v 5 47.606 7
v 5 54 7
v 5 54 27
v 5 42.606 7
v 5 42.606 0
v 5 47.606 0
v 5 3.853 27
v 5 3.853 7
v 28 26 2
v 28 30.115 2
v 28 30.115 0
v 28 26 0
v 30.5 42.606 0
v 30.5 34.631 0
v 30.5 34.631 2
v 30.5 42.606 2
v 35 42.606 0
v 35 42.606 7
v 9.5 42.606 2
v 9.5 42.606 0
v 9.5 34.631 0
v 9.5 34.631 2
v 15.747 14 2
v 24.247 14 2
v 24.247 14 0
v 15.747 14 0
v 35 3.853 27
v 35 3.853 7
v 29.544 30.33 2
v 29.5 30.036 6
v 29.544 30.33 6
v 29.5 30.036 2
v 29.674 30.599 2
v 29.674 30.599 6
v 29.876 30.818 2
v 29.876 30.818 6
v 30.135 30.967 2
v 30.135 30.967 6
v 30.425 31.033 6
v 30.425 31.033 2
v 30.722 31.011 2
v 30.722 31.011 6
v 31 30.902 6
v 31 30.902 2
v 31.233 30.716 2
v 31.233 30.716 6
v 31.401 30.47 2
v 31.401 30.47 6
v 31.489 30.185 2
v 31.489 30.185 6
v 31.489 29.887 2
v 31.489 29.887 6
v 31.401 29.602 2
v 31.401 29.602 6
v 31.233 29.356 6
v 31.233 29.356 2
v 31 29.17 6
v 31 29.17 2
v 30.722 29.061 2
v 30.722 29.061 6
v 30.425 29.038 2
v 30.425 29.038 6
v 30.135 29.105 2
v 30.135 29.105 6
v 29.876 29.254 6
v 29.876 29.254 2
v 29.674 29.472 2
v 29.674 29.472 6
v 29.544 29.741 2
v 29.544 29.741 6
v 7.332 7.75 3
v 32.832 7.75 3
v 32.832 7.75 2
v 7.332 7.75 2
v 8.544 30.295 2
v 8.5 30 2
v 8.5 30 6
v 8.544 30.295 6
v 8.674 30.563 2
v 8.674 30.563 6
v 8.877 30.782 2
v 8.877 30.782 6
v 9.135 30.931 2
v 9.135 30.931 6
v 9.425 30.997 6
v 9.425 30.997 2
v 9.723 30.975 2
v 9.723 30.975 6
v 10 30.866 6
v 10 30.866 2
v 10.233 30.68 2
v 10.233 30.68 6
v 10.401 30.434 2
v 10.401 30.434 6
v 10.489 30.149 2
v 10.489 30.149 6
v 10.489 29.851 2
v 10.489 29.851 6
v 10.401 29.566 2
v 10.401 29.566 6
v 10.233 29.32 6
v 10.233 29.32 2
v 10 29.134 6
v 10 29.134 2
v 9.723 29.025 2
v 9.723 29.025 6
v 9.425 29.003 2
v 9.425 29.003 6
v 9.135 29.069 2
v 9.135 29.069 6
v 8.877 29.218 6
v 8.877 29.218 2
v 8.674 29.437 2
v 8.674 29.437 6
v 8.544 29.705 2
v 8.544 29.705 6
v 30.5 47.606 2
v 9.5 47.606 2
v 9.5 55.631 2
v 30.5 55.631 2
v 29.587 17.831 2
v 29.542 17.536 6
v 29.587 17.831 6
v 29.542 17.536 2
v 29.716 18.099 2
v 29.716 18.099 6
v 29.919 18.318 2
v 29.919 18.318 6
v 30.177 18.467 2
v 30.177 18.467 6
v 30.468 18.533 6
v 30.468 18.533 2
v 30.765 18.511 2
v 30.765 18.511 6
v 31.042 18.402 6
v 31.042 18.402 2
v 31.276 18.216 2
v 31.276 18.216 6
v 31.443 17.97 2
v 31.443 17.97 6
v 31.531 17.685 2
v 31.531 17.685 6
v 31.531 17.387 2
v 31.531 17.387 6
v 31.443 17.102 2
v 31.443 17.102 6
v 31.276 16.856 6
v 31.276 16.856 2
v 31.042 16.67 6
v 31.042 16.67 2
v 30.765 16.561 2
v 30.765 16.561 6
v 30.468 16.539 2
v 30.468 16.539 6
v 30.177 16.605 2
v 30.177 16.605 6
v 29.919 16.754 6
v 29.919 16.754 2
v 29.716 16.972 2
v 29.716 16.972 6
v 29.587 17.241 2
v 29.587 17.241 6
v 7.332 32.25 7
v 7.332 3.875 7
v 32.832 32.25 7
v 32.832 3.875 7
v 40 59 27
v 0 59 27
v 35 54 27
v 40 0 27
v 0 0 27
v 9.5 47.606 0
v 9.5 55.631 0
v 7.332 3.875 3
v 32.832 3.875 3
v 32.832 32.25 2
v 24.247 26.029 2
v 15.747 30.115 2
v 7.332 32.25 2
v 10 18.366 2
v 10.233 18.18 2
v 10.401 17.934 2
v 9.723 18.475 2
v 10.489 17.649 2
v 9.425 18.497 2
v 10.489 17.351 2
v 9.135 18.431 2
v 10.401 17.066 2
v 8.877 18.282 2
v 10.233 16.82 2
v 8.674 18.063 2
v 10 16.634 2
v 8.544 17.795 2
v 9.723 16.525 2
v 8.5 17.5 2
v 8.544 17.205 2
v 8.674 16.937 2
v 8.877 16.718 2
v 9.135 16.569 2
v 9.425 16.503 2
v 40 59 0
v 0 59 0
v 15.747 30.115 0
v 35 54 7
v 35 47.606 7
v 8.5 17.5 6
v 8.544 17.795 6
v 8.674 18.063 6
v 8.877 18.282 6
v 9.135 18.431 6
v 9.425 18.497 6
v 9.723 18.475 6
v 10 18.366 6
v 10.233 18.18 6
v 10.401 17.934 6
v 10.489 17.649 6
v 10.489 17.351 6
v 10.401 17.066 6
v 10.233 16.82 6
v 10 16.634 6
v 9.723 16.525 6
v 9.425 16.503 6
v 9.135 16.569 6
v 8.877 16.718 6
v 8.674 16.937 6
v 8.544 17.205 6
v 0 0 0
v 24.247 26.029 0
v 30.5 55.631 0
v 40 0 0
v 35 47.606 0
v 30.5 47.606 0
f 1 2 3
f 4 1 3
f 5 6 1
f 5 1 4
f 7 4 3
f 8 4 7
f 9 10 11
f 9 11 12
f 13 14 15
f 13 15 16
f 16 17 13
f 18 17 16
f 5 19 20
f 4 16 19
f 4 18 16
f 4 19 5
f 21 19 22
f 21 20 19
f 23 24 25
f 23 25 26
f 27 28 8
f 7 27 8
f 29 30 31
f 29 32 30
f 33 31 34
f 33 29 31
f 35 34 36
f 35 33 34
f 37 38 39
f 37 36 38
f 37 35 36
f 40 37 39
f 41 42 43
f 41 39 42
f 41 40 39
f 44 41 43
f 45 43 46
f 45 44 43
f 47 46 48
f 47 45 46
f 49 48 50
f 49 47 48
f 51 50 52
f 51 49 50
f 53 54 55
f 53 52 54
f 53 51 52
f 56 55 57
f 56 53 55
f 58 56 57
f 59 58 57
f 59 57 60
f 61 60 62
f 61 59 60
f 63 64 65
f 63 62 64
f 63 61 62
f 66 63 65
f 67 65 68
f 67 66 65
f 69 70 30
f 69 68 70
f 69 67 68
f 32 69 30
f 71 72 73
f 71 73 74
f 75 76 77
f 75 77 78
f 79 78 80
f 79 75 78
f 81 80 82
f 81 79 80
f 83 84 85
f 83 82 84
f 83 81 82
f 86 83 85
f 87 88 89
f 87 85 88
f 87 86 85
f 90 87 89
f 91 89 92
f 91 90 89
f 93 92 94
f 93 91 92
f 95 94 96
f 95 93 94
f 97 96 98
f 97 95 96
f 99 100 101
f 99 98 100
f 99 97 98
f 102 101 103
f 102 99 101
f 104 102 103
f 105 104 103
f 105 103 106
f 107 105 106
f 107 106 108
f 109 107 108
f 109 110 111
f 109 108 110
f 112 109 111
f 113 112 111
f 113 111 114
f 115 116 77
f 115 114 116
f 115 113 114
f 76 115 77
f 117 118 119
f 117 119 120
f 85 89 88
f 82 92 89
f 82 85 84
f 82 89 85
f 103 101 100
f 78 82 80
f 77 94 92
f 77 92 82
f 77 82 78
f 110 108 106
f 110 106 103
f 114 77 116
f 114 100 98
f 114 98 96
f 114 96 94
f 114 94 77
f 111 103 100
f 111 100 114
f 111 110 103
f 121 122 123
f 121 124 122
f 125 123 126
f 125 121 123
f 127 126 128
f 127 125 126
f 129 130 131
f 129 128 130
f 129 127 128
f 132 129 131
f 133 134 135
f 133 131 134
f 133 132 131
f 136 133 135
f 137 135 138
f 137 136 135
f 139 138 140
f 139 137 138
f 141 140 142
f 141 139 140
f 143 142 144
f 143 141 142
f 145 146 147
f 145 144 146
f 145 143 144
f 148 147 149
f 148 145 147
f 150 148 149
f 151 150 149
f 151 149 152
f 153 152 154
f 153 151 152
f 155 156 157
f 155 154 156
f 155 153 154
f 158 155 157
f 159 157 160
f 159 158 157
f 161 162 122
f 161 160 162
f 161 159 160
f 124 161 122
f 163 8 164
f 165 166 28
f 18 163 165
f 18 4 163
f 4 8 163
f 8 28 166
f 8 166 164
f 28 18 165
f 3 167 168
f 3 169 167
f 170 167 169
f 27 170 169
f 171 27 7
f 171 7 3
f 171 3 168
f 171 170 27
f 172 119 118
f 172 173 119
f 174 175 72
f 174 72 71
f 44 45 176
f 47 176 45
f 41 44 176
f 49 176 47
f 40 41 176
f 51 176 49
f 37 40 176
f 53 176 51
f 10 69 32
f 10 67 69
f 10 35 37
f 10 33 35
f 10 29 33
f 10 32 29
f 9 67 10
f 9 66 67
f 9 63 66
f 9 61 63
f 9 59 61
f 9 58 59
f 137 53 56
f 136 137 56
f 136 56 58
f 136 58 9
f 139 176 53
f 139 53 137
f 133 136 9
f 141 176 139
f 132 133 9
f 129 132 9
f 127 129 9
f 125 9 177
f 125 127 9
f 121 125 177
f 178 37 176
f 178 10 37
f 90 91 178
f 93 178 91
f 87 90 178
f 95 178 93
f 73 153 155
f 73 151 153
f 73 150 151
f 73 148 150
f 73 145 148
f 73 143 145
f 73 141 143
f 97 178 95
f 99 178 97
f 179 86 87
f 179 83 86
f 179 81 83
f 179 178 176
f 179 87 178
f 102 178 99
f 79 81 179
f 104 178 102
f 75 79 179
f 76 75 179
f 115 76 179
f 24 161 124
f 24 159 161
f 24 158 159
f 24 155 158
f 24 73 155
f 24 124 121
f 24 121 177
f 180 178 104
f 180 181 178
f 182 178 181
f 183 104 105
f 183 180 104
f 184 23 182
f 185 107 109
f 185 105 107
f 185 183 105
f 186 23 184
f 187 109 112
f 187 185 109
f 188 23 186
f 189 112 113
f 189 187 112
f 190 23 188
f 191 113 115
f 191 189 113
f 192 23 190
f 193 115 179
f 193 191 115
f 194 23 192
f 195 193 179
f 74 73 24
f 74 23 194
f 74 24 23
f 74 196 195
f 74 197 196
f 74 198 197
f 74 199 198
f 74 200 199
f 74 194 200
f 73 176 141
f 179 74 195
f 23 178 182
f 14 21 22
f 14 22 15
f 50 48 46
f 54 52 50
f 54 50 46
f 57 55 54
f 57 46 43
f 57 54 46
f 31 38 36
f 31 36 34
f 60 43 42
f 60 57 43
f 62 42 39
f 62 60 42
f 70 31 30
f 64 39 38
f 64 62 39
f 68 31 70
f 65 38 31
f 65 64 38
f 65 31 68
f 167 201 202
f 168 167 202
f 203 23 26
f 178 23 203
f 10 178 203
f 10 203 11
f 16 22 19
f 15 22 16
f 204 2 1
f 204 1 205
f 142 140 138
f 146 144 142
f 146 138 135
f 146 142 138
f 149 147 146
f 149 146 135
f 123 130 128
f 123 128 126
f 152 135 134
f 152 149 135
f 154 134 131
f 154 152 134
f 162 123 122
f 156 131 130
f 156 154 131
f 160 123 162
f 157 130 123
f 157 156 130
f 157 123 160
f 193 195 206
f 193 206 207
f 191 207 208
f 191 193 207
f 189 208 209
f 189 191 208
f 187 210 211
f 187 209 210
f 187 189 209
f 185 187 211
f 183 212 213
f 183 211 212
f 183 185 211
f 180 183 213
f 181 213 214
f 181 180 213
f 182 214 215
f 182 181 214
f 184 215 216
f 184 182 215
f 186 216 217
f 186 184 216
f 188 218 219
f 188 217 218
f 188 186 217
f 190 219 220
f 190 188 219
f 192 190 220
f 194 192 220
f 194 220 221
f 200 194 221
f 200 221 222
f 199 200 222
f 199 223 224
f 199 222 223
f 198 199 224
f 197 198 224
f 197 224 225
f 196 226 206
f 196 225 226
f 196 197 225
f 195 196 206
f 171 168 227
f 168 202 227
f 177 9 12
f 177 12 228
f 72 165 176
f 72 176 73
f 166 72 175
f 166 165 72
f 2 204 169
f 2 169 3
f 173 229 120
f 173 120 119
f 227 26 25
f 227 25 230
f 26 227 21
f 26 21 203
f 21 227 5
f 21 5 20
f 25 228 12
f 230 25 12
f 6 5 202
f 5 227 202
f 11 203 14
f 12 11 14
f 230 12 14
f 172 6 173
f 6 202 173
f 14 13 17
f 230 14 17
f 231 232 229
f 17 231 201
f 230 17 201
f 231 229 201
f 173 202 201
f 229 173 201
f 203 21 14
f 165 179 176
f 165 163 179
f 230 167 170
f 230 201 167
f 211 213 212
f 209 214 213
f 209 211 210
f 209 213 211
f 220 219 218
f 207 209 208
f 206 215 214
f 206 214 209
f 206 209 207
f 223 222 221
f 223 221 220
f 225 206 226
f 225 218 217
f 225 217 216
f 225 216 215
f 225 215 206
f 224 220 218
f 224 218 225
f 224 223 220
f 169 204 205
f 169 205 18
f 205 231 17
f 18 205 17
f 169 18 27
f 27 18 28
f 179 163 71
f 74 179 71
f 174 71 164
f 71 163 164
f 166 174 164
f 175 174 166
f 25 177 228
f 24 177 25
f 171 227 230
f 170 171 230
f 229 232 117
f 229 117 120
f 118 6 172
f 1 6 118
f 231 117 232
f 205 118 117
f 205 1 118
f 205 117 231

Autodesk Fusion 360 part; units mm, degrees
sketch "Sketch1" plane through (0, 0, 0) normal (0, 0, 1) x (1, 0, 0)
  line L0 (0, 0) -> (0, 40)
  line L1 (0, 40) -> (40, 40)
  line L2 (40, 40) -> (40, 0)
  line L3 (40, 0) -> (0, 0)
extrude "Extrude1" add sketch "Sketch1" along normal blind 7
sketch "Sketch2" plane through (0, 0, 7) normal (0, 0, 1) x (-1, 0, 0)
  line L0 (-40, 0) -> (-40, -40)
  line L1 (-40, -40) -> (0, -40)
  line L2 (0, -40) -> (0, 0)
  line L3 (0, 0) -> (-40, 0)
  line L4 (-32.8325, -7.75) -> (-7.3325, -7.75)
  line L5 (-7.3325, -7.75) -> (-7.3325, -32.25)
  line L6 (-7.3325, -32.25) -> (-32.8325, -32.25)
  line L7 (-32.8325, -32.25) -> (-32.8325, -7.75)
  line L8 (-32.8325, -7.75) -> (-7.3325, -32.25) construction
  line L9 (-7.3325, -7.75) -> (-32.8325, -32.25) construction
  dimension "d3" = 24.5
  dimension "d4" = 25.5
extrude "Extrude2" cut sketch "Sketch2" against normal blind 5 contours L4 L5 L6 L7
sketch "Sketch3" plane through (0, 0, 7) normal (0, 0, 1) x (-1, 0, 0)
  line L0 (-7.3325, -7.75) -> (-7.3325, -32.25)
  line L1 (-7.3325, -32.25) -> (-32.8325, -32.25)
  line L2 (-32.8325, -32.25) -> (-32.8325, -7.75)
  line L3 (-32.8325, -7.75) -> (-7.3325, -7.75)
  line L4 (-40, 0) -> (-40, -40)
  line L5 (-40, -40) -> (0, -40)
  line L6 (0, -40) -> (0, 0)
  line L7 (0, 0) -> (-40, 0)
  line L8 (-7.3325, -7.75) -> (-7.3325, 0.0071)
  line L9 (-32.8325, -7.75) -> (-32.8325, 0.0018)
extrude "Extrude3" cut sketch "Sketch3" against normal blind 4 contours L3 L7 L8 L9
sketch "Sketch4" plane through (0, 0, 2) normal (0, 0, 1) x (-1, 0, 0)
  line L0 (-32.8325, -32.25) -> (-7.3325, -32.25)
  line L1 (-7.3325, -32.25) -> (-7.3325, -7.75)
  line L2 (-7.3325, -7.75) -> (-32.8325, -7.75)
  line L3 (-32.8325, -7.75) -> (-32.8325, -32.25)
  line L4 (-19.9972, -32) -> (-19.9972, -7.7499)
  line L5 (-7.3325, -20) -> (-32.8325, -20)
  line L6 (-23.9823, -7.75) -> (-23.9823, -14.25)
  line L7 (-23.9823, -14.25) -> (-7.3325, -14.25)
  line L8 (-23.9823, -14.25) -> (-32.8333, -14.25)
  line L9 (-19.9972, -14.25) -> (-19.9972, -18.25)
  line L10 (-23.9972, -14.25) -> (-15.9972, -14.25)
  line L11 (-15.9972, -14.25) -> (-15.9972, -22.25)
  line L12 (-15.9972, -22.25) -> (-23.9972, -22.25)
  line L13 (-23.9972, -22.25) -> (-23.9972, -14.25)
  line L14 (-23.9972, -14.25) -> (-15.9972, -22.25) construction
  line L15 (-15.9972, -14.25) -> (-23.9972, -22.25) construction
  dimension "d9" = 6.5
  dimension "d10" = 4
  dimension "d11" = 8
extrude "Extrude4" cut sketch "Sketch4" against normal blind 5 contours L4 L5 L7 L8 L9 L10 L13 | L4 L5 L12 L13 | L4 L5 L11 L12 | L4 L5 L7 L9 L10 L11
sketch "Sketch5" plane through (0, 0, 2) normal (0, 0, 1) x (-1, 0, 0)
  line L0 (-15.9972, -14.25) -> (-15.9972, -22.25)
  line L1 (-15.9972, -22.25) -> (-23.9972, -22.25)
  line L2 (-23.9972, -22.25) -> (-23.9972, -14.25)
  line L3 (-23.9972, -14.25) -> (-15.9972, -14.25)
  line L4 (-32.8325, -32.25) -> (-7.3325, -32.25)
  line L5 (-7.3325, -32.25) -> (-7.3325, -7.75)
  line L6 (-7.3325, -7.75) -> (-32.8325, -7.75)
  line L7 (-32.8325, -7.75) -> (-32.8325, -32.25)
  line L8 (-20, -32) -> (-20.0825, -7.75)
  line L9 (-20, -32) -> (-20, -30)
  line L10 (-20, -30) -> (-30.4999, -30.0357)
  circle A0 centre (-30.4999, -30.0357) radius 1
  line L11 (-20, -30) -> (-9.5, -30)
  circle A1 centre (-9.5, -30) radius 1
  line L12 (-9.5, -30) -> (-9.5, -17.5)
  line L13 (-30.4999, -30.0357) -> (-30.5425, -17.5358)
  circle A2 centre (-9.5, -17.5) radius 1
  circle A3 centre (-30.5425, -17.5358) radius 1
  dimension "d14" = 10.5
  dimension "d15" = 2
  dimension "d16" = 10.5
  dimension "d17" = 2
  dimension "d18" = 12.5
  dimension "d19" = 12.5
  dimension "d20" = 2
  dimension "d21" = 2
extrude "Extrude5" add sketch "Sketch5" along normal blind 2 contours A2 | L11 A1 L12 | L11 A1 L12 | A3 | L10 A0 L13 | L10 A0 L13
sketch "Sketch6" plane through (0, 0, 7) normal (0, 0, 1) x (-1, 0, 0)
  line L0 (-32.8325, -32.25) -> (-32.8325, 0)
  line L1 (-32.8325, 0) -> (-40, 0)
  line L2 (-40, 0) -> (-40, -40)
  line L3 (-40, -40) -> (0, -40)
  line L4 (0, -40) -> (0, 0)
  line L5 (0, 0) -> (-7.3325, 0)
  line L6 (-7.3325, 0) -> (-7.3325, -32.25)
  line L7 (-7.3325, -32.25) -> (-32.8325, -32.25)
  line L8 (-40, 0) -> (0, 0)
  line L9 (-20, -40) -> (-20, 0)
  line L10 (-20, -40) -> (-20, -36.5)
  line L11 (-20, -36.5) -> (-36, -36.5)
  line L12 (-20, -36.5) -> (-4, -36.5)
  circle A0 centre (-36, -36.5) radius 2.5
  circle A1 centre (-4, -36.5) radius 2.5
  line L13 (-36, -36.5) -> (-36, -6.5)
  line L14 (-4, -36.5) -> (-4, -6.5)
  circle A2 centre (-36, -6.5) radius 2.5
  circle A3 centre (-4, -6.5) radius 2.5
  dimension "d24" = 3.5
  dimension "d25" = 5
  dimension "d26" = 5
  dimension "d27" = 30
  dimension "d28" = 30
  dimension "d29" = 5
  dimension "d30" = 5
extrude "Extrude6" cut sketch "Sketch6" against normal blind 7 contours A2 | L11 A0 L13 | L11 A0 L13 | A3 | L12 A1 L14 | L12 A1 L14
sketch "Sketch7" plane through (0, 0, 7) normal (0, 0, 1) x (-1, 0, 0)
  circle A0 centre (-4, -36.5) radius 2.5
  circle A1 centre (-36, -36.5) radius 2.5
  circle A2 centre (-4, -6.5) radius 2.5
  circle A3 centre (-36, -6.5) radius 2.5
  line L0 (-32.8325, -32.25) -> (-32.8325, 0)
  line L1 (-32.8325, 0) -> (-40, 0)
  line L2 (-40, 0) -> (-40, -40)
  line L3 (-40, -40) -> (0, -40)
  line L4 (0, -40) -> (0, 0)
  line L5 (0, 0) -> (-7.3325, 0)
  line L6 (-7.3325, 0) -> (-7.3325, -32.25)
  line L7 (-7.3325, -32.25) -> (-32.8325, -32.25)
  line L8 (-15.9972, -22.25) -> (-23.9972, -14.25)
  line L9 (-23.9972, -14.25) -> (-23.9972, -22.25)
  line L10 (-23.9972, -22.25) -> (-15.9972, -14.25)
  line L11 (-24.2472, -14) -> (-15.7472, -14)
  line L12 (-15.7472, -14) -> (-15.7472, -22.5)
  line L13 (-15.7472, -22.5) -> (-24.2472, -22.5)
  line L14 (-24.2472, -22.5) -> (-24.2472, -14)
  line L15 (-24.2472, -14) -> (-15.7472, -22.5) construction
  line L16 (-15.7472, -14) -> (-24.2472, -22.5) construction
  dimension "d33" = 8.5
  dimension "d34" = 8.5
extrude "Extrude7" cut sketch "Sketch7" against normal blind 20 contours L8 L9 L10 | L11 L12 L13 L14
sketch "Sketch8" plane through (0, 0, 2) normal (0, 0, 1) x (-1, 0, 0)
  line L0 (-15.7472, -14) -> (-15.7472, -22.5)
  line L1 (-15.7472, -22.5) -> (-24.2472, -22.5)
  line L2 (-24.2472, -22.5) -> (-24.2472, -14)
  line L3 (-24.2472, -14) -> (-15.7472, -14)
  circle A0 centre (-9.5, -17.5) radius 1
  circle A1 centre (-30.4999, -30.0357) radius 1
  circle A2 centre (-30.5425, -17.5358) radius 1
  circle A3 centre (-9.5, -30) radius 1
  line L4 (-32.8325, -32.25) -> (-7.3325, -32.25)
  line L5 (-7.3325, -32.25) -> (-7.3325, -7.75)
  line L6 (-7.3325, -7.75) -> (-32.8325, -7.75)
  line L7 (-32.8325, -7.75) -> (-32.8325, -32.25)
  line L8 (-15.7472, -27.8448) -> (-24.2472, -27.8448)
  line L9 (-24.2472, -27.8448) -> (-24.2472, -17.1552)
  line L10 (-24.2472, -17.1552) -> (-15.7472, -17.1552)
  line L11 (-15.7472, -17.1552) -> (-15.7472, -27.8448)
  line L12 (-15.7472, -27.8448) -> (-24.2472, -17.1552) construction
  line L13 (-24.2472, -27.8448) -> (-15.7472, -17.1552) construction
extrude "Extrude8" cut sketch "Sketch8" against normal blind 20 contours L1 L8 L9 L11
sketch "Sketch9" plane through (0, 0, 2) normal (0, 0, 1) x (-1, 0, 0)
  line L0 (-24.2472, -27.8448) -> (-24.2472, -14)
  line L1 (-24.2472, -14) -> (-15.7472, -14)
  line L2 (-15.7472, -14) -> (-15.7472, -27.8448)
  line L3 (-15.7472, -27.8448) -> (-24.2472, -27.8448)
  circle A0 centre (-9.5, -17.5) radius 1
  circle A1 centre (-30.4999, -30.0357) radius 1
  circle A2 centre (-30.5425, -17.5358) radius 1
  circle A3 centre (-9.5, -30) radius 1
  line L4 (-32.8325, -32.25) -> (-7.3325, -32.25)
  line L5 (-7.3325, -32.25) -> (-7.3325, -7.75)
  line L6 (-7.3325, -7.75) -> (-32.8325, -7.75)
  line L7 (-32.8325, -7.75) -> (-32.8325, -32.25)
  line L8 (-15.7472, -30.1146) -> (-24.2472, -30.1146)
  line L9 (-24.2472, -30.1146) -> (-24.2472, -25.575)
  line L10 (-24.2472, -25.575) -> (-15.7472, -25.575)
  line L11 (-15.7472, -25.575) -> (-15.7472, -30.1146)
  line L12 (-15.7472, -30.1146) -> (-24.2472, -25.575) construction
  line L13 (-24.2472, -30.1146) -> (-15.7472, -25.575) construction
extrude "Extrude9" cut sketch "Sketch9" against normal blind 20 contours L3 L8 L9 L11
sketch "Sketch10" plane through (0, 0, 2) normal (0, 0, 1) x (-1, 0, 0)
  line L0 (-32.8325, -32.25) -> (-7.3325, -32.25)
  line L1 (-7.3325, -32.25) -> (-7.3325, -7.75)
  line L2 (-7.3325, -7.75) -> (-32.8325, -7.75)
  line L3 (-32.8325, -7.75) -> (-32.8325, -32.25)
  circle A0 centre (-9.5, -30) radius 1
  circle A1 centre (-30.5425, -17.5358) radius 1
  circle A2 centre (-30.4999, -30.0357) radius 1
  circle A3 centre (-9.5, -17.5) radius 1
  line L4 (-15.7472, -14) -> (-15.7472, -30.1146)
  line L5 (-15.7472, -30.1146) -> (-24.2472, -30.1146)
  line L6 (-24.2472, -30.1146) -> (-24.2472, -14)
  line L7 (-24.2472, -14) -> (-15.7472, -14)
  line L8 (-24.2472, -30.1146) -> (-28, -30.1146)
  line L9 (-28, -30.1146) -> (-28, -26)
  line L10 (-28, -26) -> (-24.2472, -26.029)
extrude "Extrude10" cut sketch "Sketch10" against normal blind 20 contours L6 L8 L9 L10
sketch "Sketch11" plane through (0, 0, 4) normal (0, 0, 1) x (-1, 0, 0)
  circle A0 centre (-9.5, -30) radius 1
  circle A1 centre (-9.5, -30) radius 1
extrude "Extrude11" add sketch "Sketch11" along normal blind 2
sketch "Sketch12" plane through (0, 0, 4) normal (0, 0, 1) x (-1, 0, 0)
  circle A0 centre (-9.5, -17.5) radius 1
  circle A1 centre (-9.5, -17.5) radius 1
extrude "Extrude12" add sketch "Sketch12" along normal blind 2
sketch "Sketch13" plane through (0, 0, 4) normal (0, 0, 1) x (-1, 0, 0)
  circle A0 centre (-30.4999, -30.0357) radius 1
  circle A1 centre (-30.4999, -30.0357) radius 1
extrude "Extrude13" add sketch "Sketch13" along normal blind 2
sketch "Sketch14" plane through (0, 0, 4) normal (0, 0, 1) x (-1, 0, 0)
  circle A0 centre (-30.5425, -17.5358) radius 1
  circle A1 centre (-30.5425, -17.5358) radius 1
extrude "Extrude14" add sketch "Sketch14" along normal blind 2
sketch "Sketch15" plane through (0, 0, 7) normal (0, 0, 1) x (-1, 0, 0)
  circle A0 centre (-4, -36.5) radius 2.5
  circle A1 centre (-36, -36.5) radius 2.5
  circle A2 centre (-4, -6.5) radius 2.5
  circle A3 centre (-36, -6.5) radius 2.5
  line L0 (-32.8325, -32.25) -> (-32.8325, 0)
  line L1 (-32.8325, 0) -> (-40, 0)
  line L2 (-40, 0) -> (-40, -40)
  line L3 (-40, -40) -> (0, -40)
  line L4 (0, -40) -> (0, 0)
  line L5 (0, 0) -> (-7.3325, 0)
  line L6 (-7.3325, 0) -> (-7.3325, -32.25)
  line L7 (-7.3325, -32.25) -> (-32.8325, -32.25)
  circle A4 centre (-4, -36.5) radius 2.5
extrude "Extrude15" add sketch "Sketch15" against normal blind 5 contours A0 A4
sketch "Sketch16" plane through (0, 0, 2) normal (0, 0, -1) x (1, 0, 0)
  circle A0 centre (4, -36.5) radius 2.5
  circle A1 centre (4, -36.5) radius 2.5
extrude "Extrude16" add sketch "Sketch16" along normal blind 2
sketch "Sketch17" plane through (0, 0, 0) normal (0, 0, 1) x (1, 0, 0)
  circle A0 centre (4, 6.5) radius 2.5
  circle A1 centre (4, 6.5) radius 2.5
  circle A2 centre (4, 6.5) radius 2.5
extrude "Extrude17" add sketch "Sketch17" along normal blind 7
sketch "Sketch18" plane through (0, 0, 7) normal (0, 0, 1) x (-1, 0, 0)
  circle A0 centre (-36, -36.5) radius 2.5
  circle A1 centre (-36, -6.5) radius 2.5
  line L0 (-32.8325, -32.25) -> (-32.8325, 0)
  line L1 (-32.8325, 0) -> (-40, 0)
  line L2 (-40, 0) -> (-40, -40)
  line L3 (-40, -40) -> (0, -40)
  line L4 (0, -40) -> (0, 0)
  line L5 (0, 0) -> (-7.3325, 0)
  line L6 (-7.3325, 0) -> (-7.3325, -32.25)
  line L7 (-7.3325, -32.25) -> (-32.8325, -32.25)
  circle A2 centre (-36, -36.5) radius 2.5
extrude "Extrude18" add sketch "Sketch18" against normal blind 7 contours A0 A2
sketch "Sketch19" plane through (0, 0, 7) normal (0, 0, 1) x (-1, 0, 0)
  circle A0 centre (-36, -6.5) radius 2.5
  line L0 (-32.8325, -32.25) -> (-32.8325, 0)
  line L1 (-32.8325, 0) -> (-40, 0)
  line L2 (-40, 0) -> (-40, -40)
  line L3 (-40, -40) -> (0, -40)
  line L4 (0, -40) -> (0, 0)
  line L5 (0, 0) -> (-7.3325, 0)
  line L6 (-7.3325, 0) -> (-7.3325, -32.25)
  line L7 (-7.3325, -32.25) -> (-32.8325, -32.25)
  circle A1 centre (-36, -6.5) radius 2.5
extrude "Extrude19" add sketch "Sketch19" against normal blind 7 contours A0 A1
sketch "Sketch20" plane through (0, 0, 0) normal (0, 0, 1) x (1, 0, 0)
  line L0 (40, 40) -> (0, 40)
  line L1 (0, 40) -> (0, 61.8124)
  line L2 (0, 61.8124) -> (40, 61.8124)
  line L3 (40, 61.8124) -> (40, 40)
  line L4 (40, 40) -> (0, 61.8124) construction
  line L5 (0, 40) -> (40, 61.8124) construction
extrude "Extrude20" add sketch "Sketch20" along normal blind 7
sketch "Sketch21" plane through (0, 0, 7) normal (0, 0, 1) x (-1, 0, 0)
  line L0 (-32.8325, -32.25) -> (-32.8325, 0)
  line L1 (-32.8325, 0) -> (-40, 0)
  line L2 (-40, 0) -> (-40, -61.8124)
  line L3 (-40, -61.8124) -> (0, -61.8124)
  line L4 (0, -61.8124) -> (0, 0)
  line L5 (0, 0) -> (-7.3325, 0)
  line L6 (-7.3325, 0) -> (-7.3325, -32.25)
  line L7 (-7.3325, -32.25) -> (-32.8325, -32.25)
  line L8 (-35, -42.6061) -> (-5, -42.6061)
  line L9 (-5, -42.6061) -> (-5, -47.6061)
  line L10 (-5, -47.6061) -> (-35, -47.6061)
  line L11 (-35, -47.6061) -> (-35, -42.6061)
  line L12 (-35, -42.6061) -> (-5, -47.6061) construction
  line L13 (-5, -42.6061) -> (-35, -47.6061) construction
  dimension "d63" = 5
  dimension "d64" = 30
extrude "Extrude21" cut sketch "Sketch21" against normal blind 7 contours L8 L9 L10 L11
sketch "Sketch22" plane through (0, 0, 7) normal (0, 0, 1) x (-1, 0, 0)
  line L0 (-5, -42.6061) -> (-5, -47.6061)
  line L1 (-5, -47.6061) -> (-35, -47.6061)
  line L2 (-35, -47.6061) -> (-35, -42.6061)
  line L3 (-35, -42.6061) -> (-5, -42.6061)
  line L4 (-32.8325, -32.25) -> (-32.8325, 0)
  line L5 (-32.8325, 0) -> (-40, 0)
  line L6 (-40, 0) -> (-40, -61.8124)
  line L7 (-40, -61.8124) -> (0, -61.8124)
  line L8 (0, -61.8124) -> (0, 0)
  line L9 (0, 0) -> (-7.3325, 0)
  line L10 (-7.3325, 0) -> (-7.3325, -32.25)
  line L11 (-7.3325, -32.25) -> (-32.8325, -32.25)
  line L12 (-20, -45) -> (-20, -56)
  line L13 (-20, -56) -> (-20, -61.8124)
  line L14 (-40, -59) -> (0, -59)
  line L15 (0, -59) -> (0, -64.6248)
  line L16 (0, -64.6248) -> (-40, -64.6248)
  line L17 (-40, -64.6248) -> (-40, -59)
  line L18 (-40, -59) -> (0, -64.6248) construction
  line L19 (0, -59) -> (-40, -64.6248) construction
  dimension "d67" = 5.6248
extrude "Extrude22" cut sketch "Sketch22" against normal blind 7 contours L7 L8 L13 L14 L15 | L6 L7 L13 L14 L17
sketch "Sketch23" plane through (0, 0, 7) normal (0, 0, 1) x (-1, 0, 0)
  line L0 (-40, -59) -> (0, -59)
  line L1 (0, -59) -> (0, 0)
  line L2 (0, 0) -> (-7.3325, 0)
  line L3 (-7.3325, 0) -> (-7.3325, -32.25)
  line L4 (-7.3325, -32.25) -> (-32.8325, -32.25)
  line L5 (-32.8325, -32.25) -> (-32.8325, 0)
  line L6 (-32.8325, 0) -> (-40, 0)
  line L7 (-40, 0) -> (-40, -59)
  line L8 (-5, -42.6061) -> (-5, -47.6061)
  line L9 (-5, -47.6061) -> (-35, -47.6061)
  line L10 (-35, -47.6061) -> (-35, -42.6061)
  line L11 (-35, -42.6061) -> (-5, -42.6061)
  circle A0 centre (-4, -55) radius 2.5
  circle A1 centre (-37, -55) radius 2.5
  circle A2 centre (-37, -4) radius 2.5
  circle A3 centre (-3.5618, -3.875) radius 2.5
  dimension "d70" = 5
  dimension "d71" = 5
  dimension "d72" = 5
  dimension "d73" = 5
extrude "Extrude23" add sketch "Sketch23" along normal blind 5 contours A0 | A1 | A2 | A3
sketch "Sketch24" plane through (0, 0, 12) normal (0, 0, 1) x (-1, 0, 0)
  circle A0 centre (-4, -55) radius 2.5
  circle A1 centre (-4, -55) radius 1
  circle A2 centre (-37, -55) radius 1
extrude "Extrude24" cut sketch "Sketch24" against normal blind 3 contours A1 | A2
sketch "Sketch25" plane through (0, 0, 12) normal (0, 0, 1) x (-1, 0, 0)
  circle A0 centre (-3.5618, -3.875) radius 2.5
  circle A1 centre (-3.5618, -3.875) radius 1
  circle A2 centre (-37, -4) radius 1
  dimension "d78" = 2
extrude "Extrude25" cut sketch "Sketch25" against normal blind 3 contours A1 | A2
sketch "Sketch26" plane through (0, 0, 0) normal (0, 0, -1) x (1, 0, 0)
  line L0 (0, -59) -> (40, -59)
  line L1 (40, -59) -> (40, 0)
  line L2 (40, 0) -> (0, 0)
  line L3 (0, 0) -> (0, -59)
  line L4 (5, -47.6061) -> (5, -42.6061)
  line L5 (5, -42.6061) -> (35, -42.6061)
  line L6 (35, -42.6061) -> (35, -47.6061)
  line L7 (35, -47.6061) -> (5, -47.6061)
  line L8 (28, -30.1146) -> (15.7472, -30.1146)
  line L9 (15.7472, -30.1146) -> (15.7472, -14)
  line L10 (15.7472, -14) -> (24.2472, -14)
  line L11 (24.2472, -14) -> (24.2472, -26.029)
  line L12 (24.2472, -26.029) -> (28, -26)
  line L13 (28, -26) -> (28, -30.1146)
  line L14 (30.5, -55.6314) -> (9.5, -55.6314)
  line L15 (9.5, -55.6314) -> (9.5, -34.6314)
  line L16 (9.5, -34.6314) -> (30.5, -34.6314)
  line L17 (30.5, -34.6314) -> (30.5, -55.6314)
  line L18 (30.5, -55.6314) -> (9.5, -34.6314) construction
  line L19 (9.5, -55.6314) -> (30.5, -34.6314) construction
  dimension "d81" = 21
  dimension "d82" = 21
extrude "Extrude26" cut sketch "Sketch26" against normal blind 2 contours L7 L14 L15 L17 | L5 L15 L16 L17
extrude "Extrude27" cut 1 faces at (35.013, 4.1739, 12) along direction (0, 0, -1) blind 5
extrude "Extrude28" cut 1 faces at (36.9751, 4.3324, 9) along direction (0, 0, -1) blind 2
extrude "Extrude29" cut 1 faces at (1.5748, 4.0489, 12) along direction (0, 0, -1) blind 5
extrude "Extrude30" cut 1 faces at (3.9958, 3.666, 9) along direction (0, 0, -1) blind 2
extrude "Extrude31" cut 1 faces at (2.013, 55.1739, 12) along direction (0, 0, -1) blind 5
extrude "Extrude32" cut 1 faces at (4.6415, 54.7287, 9) along direction (0, 0, -1) blind 2
extrude "Extrude33" cut 1 faces at (35.013, 55.1739, 12) along direction (0, 0, -1) blind 5
extrude "Extrude34" cut 1 faces at (37.4221, 54.7901, 9) along direction (0, 0, -1) blind 2
sketch "Sketch27" plane through (0, 0, 3) normal (0, 0, 1) x (-1, 0, 0)
  line L0 (-7.3325, -7.75) -> (-7.3325, 0)
  line L1 (-7.3325, 0) -> (-32.8325, 0)
  line L2 (-32.8325, 0) -> (-32.8325, -7.75)
  line L3 (-32.8325, -7.75) -> (-7.3325, -7.75)
  line L4 (-7.3325, -3.875) -> (-32.8325, -3.875)
  line L5 (-7.3325, -3.875) -> (-7.3325, 0)
  line L6 (-7.3325, 0) -> (-32.8325, 0)
  line L7 (-32.8325, 0) -> (-32.8325, -3.875)
extrude "Extrude35" add sketch "Sketch27" along normal blind 4 contours L0 L1 L2 L4 L5 L6 L7
sketch "Sketch28" plane through (0, 0, 7) normal (0, 0, 1) x (-1, 0, 0)
  line L0 (0, 0) -> (-40, 0)
  line L1 (-40, 0) -> (-40, -59)
  line L2 (-40, -59) -> (0, -59)
  line L3 (0, -59) -> (0, 0)
  line L4 (-32.8325, -3.875) -> (-7.3325, -3.875)
  line L5 (-7.3325, -3.875) -> (-7.3325, -32.25)
  line L6 (-7.3325, -32.25) -> (-32.8325, -32.25)
  line L7 (-32.8325, -32.25) -> (-32.8325, -3.875)
  line L8 (-5, -42.6061) -> (-5, -47.6061)
  line L9 (-5, -47.6061) -> (-35, -47.6061)
  line L10 (-35, -47.6061) -> (-35, -42.6061)
  line L11 (-35, -42.6061) -> (-5, -42.6061)
  line L12 (0, -59) -> (-40, -59)
  line L13 (-40, -59) -> (-40, -54)
  line L14 (-40, -54) -> (0, -54)
  line L15 (0, -54) -> (0, -59)
  dimension "d103" = 5
extrude "Extrude36" add sketch "Sketch28" along normal blind 20 contours L1 L2 L3 L12 L13 L14 L15
sketch "Sketch29" plane through (0, 0, 7) normal (0, 0, 1) x (-1, 0, 0)
  line L0 (-5, -42.6061) -> (-5, -47.6061)
  line L1 (-5, -47.6061) -> (-35, -47.6061)
  line L2 (-35, -47.6061) -> (-35, -42.6061)
  line L3 (-35, -42.6061) -> (-5, -42.6061)
  line L4 (-32.8325, -3.875) -> (-7.3325, -3.875)
  line L5 (-7.3325, -3.875) -> (-7.3325, -32.25)
  line L6 (-7.3325, -32.25) -> (-32.8325, -32.25)
  line L7 (-32.8325, -32.25) -> (-32.8325, -3.875)
  line L8 (-40, -54) -> (0, -54)
  line L9 (0, -54) -> (0, 0)
  line L10 (0, 0) -> (-40, 0)
  line L11 (-40, 0) -> (-40, -54)
  line L12 (-40, -54) -> (-35, -54)
  line L13 (-35, -54) -> (-35, 0)
  line L14 (-35, 0) -> (-40, 0)
  line L15 (-40, 0) -> (-40, -54)
extrude "Extrude37" add sketch "Sketch29" along normal blind 20 contours L2 L8 L10 L11 L12 L13 L14 L15
sketch "Sketch30" plane through (0, 0, 7) normal (0, 0, 1) x (-1, 0, 0)
  line L0 (-35, 0) -> (-35, -42.6061)
  line L1 (-35, -42.6061) -> (-5, -42.6061)
  line L2 (-5, -42.6061) -> (-5, -47.6061)
  line L3 (-5, -47.6061) -> (-35, -47.6061)
  line L4 (-35, -47.6061) -> (-35, -54)
  line L5 (-35, -54) -> (0, -54)
  line L6 (0, -54) -> (0, 0)
  line L7 (0, 0) -> (-35, 0)
  line L8 (-32.8325, -3.875) -> (-7.3325, -3.875)
  line L9 (-7.3325, -3.875) -> (-7.3325, -32.25)
  line L10 (-7.3325, -32.25) -> (-32.8325, -32.25)
  line L11 (-32.8325, -32.25) -> (-32.8325, -3.875)
  line L12 (0, -54) -> (-5, -54)
  line L13 (-5, -54) -> (-5, 0)
  line L14 (-5, 0) -> (0, 0)
  line L15 (0, 0) -> (0, -54)
extrude "Extrude38" add sketch "Sketch30" along normal blind 20 contours L2 L5 L6 L7 L12 L13 L14 L15
sketch "Sketch31" plane through (0, 0, 7) normal (0, 0, 1) x (-1, 0, 0)
  line L0 (-5, -42.6061) -> (-5, 0)
  line L1 (-5, 0) -> (-35, 0)
  line L2 (-35, 0) -> (-35, -42.6061)
  line L3 (-35, -42.6061) -> (-5, -42.6061)
  line L4 (-32.8325, -3.875) -> (-7.3325, -3.875)
  line L5 (-7.3325, -3.875) -> (-7.3325, -32.25)
  line L6 (-7.3325, -32.25) -> (-32.8325, -32.25)
  line L7 (-32.8325, -32.25) -> (-32.8325, -3.875)
  line L8 (-5, 0) -> (-35, 0)
  line L9 (-35, 0) -> (-35, -3.8534)
  line L10 (-35, -3.8534) -> (-5, -3.8534)
  line L11 (-5, -3.8534) -> (-5, 0)
extrude "Extrude39" add sketch "Sketch31" along normal blind 20 contours L0 L1 L2 L8 L9 L10 L11
